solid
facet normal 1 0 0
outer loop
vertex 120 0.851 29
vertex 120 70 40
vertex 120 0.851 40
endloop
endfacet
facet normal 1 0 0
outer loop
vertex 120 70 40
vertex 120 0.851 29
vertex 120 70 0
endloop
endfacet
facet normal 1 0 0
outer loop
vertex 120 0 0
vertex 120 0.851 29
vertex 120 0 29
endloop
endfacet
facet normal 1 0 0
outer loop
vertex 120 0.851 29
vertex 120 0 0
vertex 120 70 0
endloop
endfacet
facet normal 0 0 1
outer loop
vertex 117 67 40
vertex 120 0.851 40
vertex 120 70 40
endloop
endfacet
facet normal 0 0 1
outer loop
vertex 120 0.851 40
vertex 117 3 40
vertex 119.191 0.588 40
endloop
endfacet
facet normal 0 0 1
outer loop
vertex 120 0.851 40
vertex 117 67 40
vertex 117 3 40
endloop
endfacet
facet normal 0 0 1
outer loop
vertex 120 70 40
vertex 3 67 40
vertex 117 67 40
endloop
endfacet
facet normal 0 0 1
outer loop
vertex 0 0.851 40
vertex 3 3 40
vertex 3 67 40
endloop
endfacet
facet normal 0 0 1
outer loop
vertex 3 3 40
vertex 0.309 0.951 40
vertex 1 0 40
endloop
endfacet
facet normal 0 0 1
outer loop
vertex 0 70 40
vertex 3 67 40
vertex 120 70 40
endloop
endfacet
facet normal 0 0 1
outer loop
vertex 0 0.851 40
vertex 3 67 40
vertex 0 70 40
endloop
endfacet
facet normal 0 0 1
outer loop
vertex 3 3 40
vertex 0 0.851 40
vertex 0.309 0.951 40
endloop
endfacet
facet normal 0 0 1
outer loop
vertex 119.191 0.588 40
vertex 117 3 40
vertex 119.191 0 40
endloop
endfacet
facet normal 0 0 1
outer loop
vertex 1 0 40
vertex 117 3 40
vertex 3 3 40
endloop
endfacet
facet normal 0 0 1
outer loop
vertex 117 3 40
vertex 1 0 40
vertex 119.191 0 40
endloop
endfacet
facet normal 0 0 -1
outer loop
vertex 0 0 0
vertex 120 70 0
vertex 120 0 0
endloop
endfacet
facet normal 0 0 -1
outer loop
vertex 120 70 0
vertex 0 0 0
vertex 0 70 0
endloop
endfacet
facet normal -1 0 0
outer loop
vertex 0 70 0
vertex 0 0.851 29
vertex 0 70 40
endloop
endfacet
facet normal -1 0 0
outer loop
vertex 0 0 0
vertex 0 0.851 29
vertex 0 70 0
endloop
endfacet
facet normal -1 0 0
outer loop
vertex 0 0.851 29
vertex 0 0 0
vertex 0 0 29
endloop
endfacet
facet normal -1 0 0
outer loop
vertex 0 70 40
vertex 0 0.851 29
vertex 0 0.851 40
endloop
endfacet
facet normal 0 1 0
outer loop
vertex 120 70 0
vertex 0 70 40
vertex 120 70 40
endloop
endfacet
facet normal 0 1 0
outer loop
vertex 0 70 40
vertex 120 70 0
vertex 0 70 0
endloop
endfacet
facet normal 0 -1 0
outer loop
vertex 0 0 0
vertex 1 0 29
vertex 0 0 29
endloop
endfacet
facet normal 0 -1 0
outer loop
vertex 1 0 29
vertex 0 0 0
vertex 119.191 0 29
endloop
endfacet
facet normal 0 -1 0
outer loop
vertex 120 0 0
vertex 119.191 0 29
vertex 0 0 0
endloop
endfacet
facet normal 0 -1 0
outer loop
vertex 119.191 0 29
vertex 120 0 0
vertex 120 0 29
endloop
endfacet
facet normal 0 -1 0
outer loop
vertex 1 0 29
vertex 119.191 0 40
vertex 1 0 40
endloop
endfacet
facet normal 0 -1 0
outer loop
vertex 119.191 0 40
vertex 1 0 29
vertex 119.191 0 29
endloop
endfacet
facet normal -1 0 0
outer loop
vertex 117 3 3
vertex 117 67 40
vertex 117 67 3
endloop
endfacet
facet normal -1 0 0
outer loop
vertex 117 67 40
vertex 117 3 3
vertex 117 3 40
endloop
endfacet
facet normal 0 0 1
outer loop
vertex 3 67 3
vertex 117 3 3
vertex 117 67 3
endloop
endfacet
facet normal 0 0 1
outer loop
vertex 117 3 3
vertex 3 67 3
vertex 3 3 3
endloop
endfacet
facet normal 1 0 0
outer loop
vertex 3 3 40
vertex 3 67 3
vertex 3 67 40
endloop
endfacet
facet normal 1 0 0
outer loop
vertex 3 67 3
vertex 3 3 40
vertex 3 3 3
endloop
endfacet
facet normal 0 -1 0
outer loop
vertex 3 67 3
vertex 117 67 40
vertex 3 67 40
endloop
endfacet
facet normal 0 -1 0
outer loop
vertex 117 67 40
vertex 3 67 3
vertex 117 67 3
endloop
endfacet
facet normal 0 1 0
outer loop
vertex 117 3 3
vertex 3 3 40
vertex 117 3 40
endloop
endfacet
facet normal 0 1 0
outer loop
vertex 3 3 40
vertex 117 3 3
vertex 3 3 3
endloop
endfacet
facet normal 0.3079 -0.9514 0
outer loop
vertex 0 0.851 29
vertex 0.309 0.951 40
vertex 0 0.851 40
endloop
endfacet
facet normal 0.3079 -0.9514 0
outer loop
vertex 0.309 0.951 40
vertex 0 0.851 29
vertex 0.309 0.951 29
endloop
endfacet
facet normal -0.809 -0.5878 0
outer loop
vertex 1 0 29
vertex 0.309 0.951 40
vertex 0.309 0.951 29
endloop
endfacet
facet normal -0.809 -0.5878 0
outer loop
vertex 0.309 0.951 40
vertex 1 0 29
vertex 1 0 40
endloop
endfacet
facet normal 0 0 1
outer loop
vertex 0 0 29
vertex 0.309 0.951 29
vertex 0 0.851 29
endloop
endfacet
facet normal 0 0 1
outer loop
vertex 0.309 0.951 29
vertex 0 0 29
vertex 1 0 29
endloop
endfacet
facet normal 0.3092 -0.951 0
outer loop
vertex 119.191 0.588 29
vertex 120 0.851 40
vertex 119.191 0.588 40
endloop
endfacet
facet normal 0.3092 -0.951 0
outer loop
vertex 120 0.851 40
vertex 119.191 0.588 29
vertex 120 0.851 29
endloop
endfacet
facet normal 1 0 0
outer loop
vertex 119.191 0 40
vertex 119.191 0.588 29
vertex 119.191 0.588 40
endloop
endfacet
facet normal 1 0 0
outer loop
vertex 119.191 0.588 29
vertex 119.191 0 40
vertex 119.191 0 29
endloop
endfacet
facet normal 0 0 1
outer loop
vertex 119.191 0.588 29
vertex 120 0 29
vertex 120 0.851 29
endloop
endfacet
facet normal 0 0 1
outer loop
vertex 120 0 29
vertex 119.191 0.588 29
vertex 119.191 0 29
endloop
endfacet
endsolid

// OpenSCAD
// --- Buffer tank for mini horizontal gel-electrophoresis box ---
// Print orientation: resting on XY plane at z = 0, building upward (+Z)

// Outer dimensions
outer_x = 120;   // mm, X direction
outer_y = 70;    // mm, Y direction
outer_z = 40;    // mm, Z direction

// Wall and floor thickness
wall_thick = 3;  // mm
floor_thick = 3; // mm

// Platform dimensions
platform_length = 60;  // mm, X direction (centred)
platform_top_z = 13;   // mm, top of platform above inner floor

// Electrode wire holes
hole_dia = 2;    // mm, diameter
hole_z = 30;     // mm, height of hole centre

// --- Derived dimensions ---
inner_x = outer_x - 2 * wall_thick;
inner_y = outer_y - 2 * wall_thick;
inner_z = outer_z - floor_thick;

platform_x_start = (inner_x - platform_length) / 2;
platform_y_start = 0; // spans full inner Y
platform_y_end = inner_y;
platform_height = platform_top_z - floor_thick;

// --- Build the part ---
difference() {
    // Outer shell (solid block)
    union() {
        // Main outer box
        cube([outer_x, outer_y, outer_z], center = false);
    }
    
    // Hollow out the interior
    translate([wall_thick, wall_thick, floor_thick]) {
        cube([inner_x, inner_y, inner_z], center = false);
    }
    
    // Electrode wire holes (through end walls)
    // Left end wall hole
    translate([
        0,  // X: starts at left edge
        0,  // Y: centred
        hole_z - hole_dia / 2
    ]) {
        cylinder(
            d = hole_dia,
            h = outer_x + 0.01,  // extend past both walls
            center = false
        );
    }
    
    // Right end wall hole
    translate([
        outer_x,  // X: starts at right edge
        0,
        hole_z - hole_dia / 2
    ]) {
        cylinder(
            d = hole_dia,
            h = outer_x + 0.01,
            center = false
        );
    }
}
